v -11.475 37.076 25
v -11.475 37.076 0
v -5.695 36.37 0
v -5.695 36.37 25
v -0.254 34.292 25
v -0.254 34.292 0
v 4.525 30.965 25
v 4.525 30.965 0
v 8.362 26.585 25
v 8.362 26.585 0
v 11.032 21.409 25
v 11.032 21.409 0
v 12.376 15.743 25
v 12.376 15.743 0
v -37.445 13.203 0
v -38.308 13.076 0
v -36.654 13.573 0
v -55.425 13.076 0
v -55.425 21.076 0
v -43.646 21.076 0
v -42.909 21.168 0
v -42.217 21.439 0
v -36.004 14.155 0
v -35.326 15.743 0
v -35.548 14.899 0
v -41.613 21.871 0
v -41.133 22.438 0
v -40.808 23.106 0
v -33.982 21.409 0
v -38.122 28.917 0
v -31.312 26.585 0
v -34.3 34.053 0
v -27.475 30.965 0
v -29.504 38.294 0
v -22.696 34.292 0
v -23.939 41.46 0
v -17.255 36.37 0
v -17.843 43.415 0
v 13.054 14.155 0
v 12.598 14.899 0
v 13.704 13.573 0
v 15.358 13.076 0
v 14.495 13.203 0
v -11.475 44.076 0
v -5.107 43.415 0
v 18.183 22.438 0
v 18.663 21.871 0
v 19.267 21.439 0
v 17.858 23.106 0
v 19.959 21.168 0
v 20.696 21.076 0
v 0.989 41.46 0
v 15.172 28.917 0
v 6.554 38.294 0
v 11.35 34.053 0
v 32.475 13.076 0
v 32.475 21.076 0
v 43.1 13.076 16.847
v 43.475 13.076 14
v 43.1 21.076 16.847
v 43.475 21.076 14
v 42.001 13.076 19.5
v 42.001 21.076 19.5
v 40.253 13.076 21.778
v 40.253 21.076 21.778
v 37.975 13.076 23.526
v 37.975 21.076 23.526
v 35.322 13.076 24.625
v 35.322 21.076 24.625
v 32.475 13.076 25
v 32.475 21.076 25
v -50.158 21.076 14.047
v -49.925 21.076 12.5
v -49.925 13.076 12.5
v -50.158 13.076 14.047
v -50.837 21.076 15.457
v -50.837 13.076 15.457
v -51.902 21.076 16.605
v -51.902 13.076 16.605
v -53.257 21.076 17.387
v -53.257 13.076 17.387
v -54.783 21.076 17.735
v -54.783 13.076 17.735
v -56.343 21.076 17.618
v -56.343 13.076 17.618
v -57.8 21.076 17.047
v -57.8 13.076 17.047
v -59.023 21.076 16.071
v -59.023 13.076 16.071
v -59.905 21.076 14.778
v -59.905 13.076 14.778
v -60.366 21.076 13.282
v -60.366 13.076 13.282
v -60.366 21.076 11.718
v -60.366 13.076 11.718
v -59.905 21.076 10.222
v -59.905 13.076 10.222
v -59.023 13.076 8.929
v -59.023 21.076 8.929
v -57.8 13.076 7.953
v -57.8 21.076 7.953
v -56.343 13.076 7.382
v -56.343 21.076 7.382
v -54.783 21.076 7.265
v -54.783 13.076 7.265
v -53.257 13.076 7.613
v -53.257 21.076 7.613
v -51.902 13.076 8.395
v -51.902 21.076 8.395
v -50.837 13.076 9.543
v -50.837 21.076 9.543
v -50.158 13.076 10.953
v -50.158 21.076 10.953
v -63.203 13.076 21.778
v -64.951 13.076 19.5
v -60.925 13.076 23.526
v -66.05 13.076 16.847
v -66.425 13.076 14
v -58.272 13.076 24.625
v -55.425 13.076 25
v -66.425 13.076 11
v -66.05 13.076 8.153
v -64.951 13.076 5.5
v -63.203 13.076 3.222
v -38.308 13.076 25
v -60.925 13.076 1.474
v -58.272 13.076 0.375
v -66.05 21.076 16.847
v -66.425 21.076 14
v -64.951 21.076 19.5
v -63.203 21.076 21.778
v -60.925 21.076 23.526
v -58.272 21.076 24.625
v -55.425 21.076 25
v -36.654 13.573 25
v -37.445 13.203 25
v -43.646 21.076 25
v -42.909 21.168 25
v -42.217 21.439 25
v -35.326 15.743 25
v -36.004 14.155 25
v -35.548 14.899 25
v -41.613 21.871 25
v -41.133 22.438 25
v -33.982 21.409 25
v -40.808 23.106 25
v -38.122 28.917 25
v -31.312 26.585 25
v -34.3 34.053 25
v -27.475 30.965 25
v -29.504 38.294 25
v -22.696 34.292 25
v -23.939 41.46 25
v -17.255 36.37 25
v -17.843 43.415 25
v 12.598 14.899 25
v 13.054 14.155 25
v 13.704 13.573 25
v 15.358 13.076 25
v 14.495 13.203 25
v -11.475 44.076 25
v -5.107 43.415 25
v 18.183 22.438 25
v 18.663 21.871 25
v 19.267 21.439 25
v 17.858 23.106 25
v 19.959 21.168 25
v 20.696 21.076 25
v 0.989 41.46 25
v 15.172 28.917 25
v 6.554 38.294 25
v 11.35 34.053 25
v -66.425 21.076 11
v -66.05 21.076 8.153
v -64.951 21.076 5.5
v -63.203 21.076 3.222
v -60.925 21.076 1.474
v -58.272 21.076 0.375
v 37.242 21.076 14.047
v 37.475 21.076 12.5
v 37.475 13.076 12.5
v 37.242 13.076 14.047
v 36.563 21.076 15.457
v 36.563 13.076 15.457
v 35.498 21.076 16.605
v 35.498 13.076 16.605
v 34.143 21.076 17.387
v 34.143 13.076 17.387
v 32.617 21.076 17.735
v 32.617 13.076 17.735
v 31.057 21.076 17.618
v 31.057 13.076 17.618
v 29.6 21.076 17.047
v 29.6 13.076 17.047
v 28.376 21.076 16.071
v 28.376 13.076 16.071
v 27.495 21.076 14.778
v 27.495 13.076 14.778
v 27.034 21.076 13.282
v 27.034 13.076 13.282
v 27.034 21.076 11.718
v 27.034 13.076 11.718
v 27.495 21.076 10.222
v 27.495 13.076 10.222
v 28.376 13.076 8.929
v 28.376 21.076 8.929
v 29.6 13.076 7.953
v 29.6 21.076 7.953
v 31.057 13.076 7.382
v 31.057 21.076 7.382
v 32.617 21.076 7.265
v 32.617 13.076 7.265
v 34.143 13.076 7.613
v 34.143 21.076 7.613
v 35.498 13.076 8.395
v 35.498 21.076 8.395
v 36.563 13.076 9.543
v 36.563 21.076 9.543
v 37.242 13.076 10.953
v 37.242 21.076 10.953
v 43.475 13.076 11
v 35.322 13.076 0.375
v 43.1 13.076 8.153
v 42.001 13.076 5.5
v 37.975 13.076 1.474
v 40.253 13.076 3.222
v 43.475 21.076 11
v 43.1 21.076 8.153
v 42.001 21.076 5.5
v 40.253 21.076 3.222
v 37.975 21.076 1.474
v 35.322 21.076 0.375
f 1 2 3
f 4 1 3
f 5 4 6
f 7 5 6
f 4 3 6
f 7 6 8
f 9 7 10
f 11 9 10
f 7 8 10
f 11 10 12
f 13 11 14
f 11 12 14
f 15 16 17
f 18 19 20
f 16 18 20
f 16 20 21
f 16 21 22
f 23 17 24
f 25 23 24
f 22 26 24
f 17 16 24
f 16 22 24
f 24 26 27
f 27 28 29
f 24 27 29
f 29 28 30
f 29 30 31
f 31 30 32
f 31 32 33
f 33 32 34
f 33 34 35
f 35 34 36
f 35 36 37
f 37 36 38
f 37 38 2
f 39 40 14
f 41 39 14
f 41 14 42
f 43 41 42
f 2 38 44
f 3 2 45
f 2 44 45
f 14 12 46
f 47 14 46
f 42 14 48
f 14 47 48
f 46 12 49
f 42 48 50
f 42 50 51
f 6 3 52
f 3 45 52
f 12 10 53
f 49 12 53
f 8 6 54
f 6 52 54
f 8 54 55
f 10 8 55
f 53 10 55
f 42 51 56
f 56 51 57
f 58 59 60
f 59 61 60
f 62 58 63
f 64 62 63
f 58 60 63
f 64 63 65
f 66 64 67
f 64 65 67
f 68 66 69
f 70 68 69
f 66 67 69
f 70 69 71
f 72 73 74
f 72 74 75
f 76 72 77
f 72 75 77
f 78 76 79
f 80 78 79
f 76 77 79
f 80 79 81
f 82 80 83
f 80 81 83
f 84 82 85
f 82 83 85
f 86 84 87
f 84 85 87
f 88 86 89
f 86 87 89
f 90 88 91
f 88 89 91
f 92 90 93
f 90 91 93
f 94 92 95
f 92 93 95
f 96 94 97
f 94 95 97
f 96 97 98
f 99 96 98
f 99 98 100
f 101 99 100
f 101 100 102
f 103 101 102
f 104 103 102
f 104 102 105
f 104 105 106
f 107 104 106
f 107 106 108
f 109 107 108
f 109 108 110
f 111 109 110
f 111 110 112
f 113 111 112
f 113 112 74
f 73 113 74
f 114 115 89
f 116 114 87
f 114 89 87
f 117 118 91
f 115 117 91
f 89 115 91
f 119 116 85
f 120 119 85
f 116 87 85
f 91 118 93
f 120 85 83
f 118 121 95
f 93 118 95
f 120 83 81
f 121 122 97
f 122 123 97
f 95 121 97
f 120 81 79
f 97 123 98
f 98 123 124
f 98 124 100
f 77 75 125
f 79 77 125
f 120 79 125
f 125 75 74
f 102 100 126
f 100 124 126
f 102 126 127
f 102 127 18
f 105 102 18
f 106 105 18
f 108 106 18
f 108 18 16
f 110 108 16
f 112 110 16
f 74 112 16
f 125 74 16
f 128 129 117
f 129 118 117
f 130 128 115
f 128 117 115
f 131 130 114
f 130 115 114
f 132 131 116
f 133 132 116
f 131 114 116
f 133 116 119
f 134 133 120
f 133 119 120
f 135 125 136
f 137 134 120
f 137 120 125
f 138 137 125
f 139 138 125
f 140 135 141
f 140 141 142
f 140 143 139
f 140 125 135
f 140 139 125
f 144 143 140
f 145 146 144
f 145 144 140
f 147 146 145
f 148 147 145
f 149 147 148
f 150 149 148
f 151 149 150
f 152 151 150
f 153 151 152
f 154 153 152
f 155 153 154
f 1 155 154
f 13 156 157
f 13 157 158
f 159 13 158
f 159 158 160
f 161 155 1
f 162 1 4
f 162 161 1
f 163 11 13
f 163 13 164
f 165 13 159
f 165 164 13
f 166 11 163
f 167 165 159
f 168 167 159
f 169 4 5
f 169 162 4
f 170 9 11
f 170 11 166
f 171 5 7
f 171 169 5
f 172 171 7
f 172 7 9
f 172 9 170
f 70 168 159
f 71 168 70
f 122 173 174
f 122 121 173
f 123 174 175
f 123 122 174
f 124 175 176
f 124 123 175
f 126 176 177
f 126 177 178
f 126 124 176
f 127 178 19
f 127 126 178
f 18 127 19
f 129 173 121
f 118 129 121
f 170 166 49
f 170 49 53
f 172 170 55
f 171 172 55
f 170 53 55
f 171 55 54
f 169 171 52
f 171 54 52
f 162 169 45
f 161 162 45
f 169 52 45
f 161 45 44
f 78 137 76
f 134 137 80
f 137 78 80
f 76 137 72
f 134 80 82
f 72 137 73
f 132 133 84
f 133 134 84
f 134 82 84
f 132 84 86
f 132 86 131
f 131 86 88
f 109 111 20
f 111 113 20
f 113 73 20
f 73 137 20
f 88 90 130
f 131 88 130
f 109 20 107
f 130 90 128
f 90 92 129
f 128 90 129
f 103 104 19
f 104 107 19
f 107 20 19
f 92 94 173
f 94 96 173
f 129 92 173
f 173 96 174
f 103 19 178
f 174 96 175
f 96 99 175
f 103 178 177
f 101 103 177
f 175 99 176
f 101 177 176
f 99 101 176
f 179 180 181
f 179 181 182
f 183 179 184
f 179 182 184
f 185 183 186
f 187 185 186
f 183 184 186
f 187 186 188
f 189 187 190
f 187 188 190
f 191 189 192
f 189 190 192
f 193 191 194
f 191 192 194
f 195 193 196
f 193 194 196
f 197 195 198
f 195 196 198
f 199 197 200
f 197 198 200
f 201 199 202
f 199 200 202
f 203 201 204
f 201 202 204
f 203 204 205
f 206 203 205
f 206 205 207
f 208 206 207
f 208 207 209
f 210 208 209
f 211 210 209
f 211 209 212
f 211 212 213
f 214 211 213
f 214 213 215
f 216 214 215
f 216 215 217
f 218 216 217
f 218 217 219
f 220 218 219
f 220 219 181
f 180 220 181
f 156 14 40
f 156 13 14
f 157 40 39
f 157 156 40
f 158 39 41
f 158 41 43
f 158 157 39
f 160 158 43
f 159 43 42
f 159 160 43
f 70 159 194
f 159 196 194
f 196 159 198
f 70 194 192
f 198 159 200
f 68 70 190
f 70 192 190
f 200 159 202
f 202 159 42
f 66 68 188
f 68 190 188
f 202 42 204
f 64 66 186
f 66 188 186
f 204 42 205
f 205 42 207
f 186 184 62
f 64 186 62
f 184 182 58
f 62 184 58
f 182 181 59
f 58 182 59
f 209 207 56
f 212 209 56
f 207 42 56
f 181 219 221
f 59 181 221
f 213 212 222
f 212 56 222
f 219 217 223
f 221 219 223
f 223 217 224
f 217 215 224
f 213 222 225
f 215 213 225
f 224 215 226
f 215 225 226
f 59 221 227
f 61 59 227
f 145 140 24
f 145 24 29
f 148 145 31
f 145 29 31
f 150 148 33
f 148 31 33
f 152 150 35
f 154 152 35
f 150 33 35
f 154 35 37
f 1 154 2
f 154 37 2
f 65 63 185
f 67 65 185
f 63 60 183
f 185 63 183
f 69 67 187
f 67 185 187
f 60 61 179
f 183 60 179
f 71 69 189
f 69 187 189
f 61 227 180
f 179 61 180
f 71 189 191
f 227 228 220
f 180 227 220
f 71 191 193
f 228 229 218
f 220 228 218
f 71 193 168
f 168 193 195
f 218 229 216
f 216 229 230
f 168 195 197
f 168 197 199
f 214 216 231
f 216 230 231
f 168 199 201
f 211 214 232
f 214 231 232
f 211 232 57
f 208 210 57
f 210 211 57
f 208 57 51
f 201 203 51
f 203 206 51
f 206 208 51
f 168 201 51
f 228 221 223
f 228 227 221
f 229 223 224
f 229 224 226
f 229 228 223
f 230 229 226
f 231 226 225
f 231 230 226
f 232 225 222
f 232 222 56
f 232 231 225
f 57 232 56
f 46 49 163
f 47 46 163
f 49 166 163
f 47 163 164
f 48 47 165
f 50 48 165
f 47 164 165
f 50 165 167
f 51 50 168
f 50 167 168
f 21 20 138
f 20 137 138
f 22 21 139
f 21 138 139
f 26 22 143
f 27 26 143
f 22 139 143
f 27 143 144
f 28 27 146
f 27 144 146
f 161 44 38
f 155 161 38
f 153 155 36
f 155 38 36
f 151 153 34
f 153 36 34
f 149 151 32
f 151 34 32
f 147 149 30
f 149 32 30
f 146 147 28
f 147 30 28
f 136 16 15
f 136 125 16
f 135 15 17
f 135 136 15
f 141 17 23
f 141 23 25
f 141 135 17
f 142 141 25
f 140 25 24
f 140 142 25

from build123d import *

# Parameters (mm, degrees)
F1_DEPTH = 25
F2_R     = 11
F3_R     = 3
F4_R     = 3
F6_D     = 10.5


with BuildPart() as f1:
    # F0 (on Top) → F1 (new body)
    with BuildSketch(Plane.XY):
        with BuildLine():
            ThreePointArc((-42.475013, 13.076226), (-42.211382, 17.110535), (-41.424972, 21.076226))
            Line((-41.424972, 21.076226), (-66.424972, 21.076226))
            Line((-66.424972, 21.076226), (-66.424972, 13.076226))
            Line((-66.424972, 13.076226), (-42.475013, 13.076226))
        make_face()
        with BuildLine():
            Line((43.474945, 21.076226), (18.474945, 21.076226))
            ThreePointArc((18.474945, 21.076226), (19.261355, 17.110535), (19.524987, 13.076226))
            Line((19.524987, 13.076226), (43.474945, 13.076226))
            Line((43.474945, 13.076226), (43.474945, 21.076226))
        make_face()
        with BuildLine():
            ThreePointArc((18.474945, 21.076226), (7.406194, 37.662808), (-11.475013, 44.076226))
            ThreePointArc((-11.475013, 44.076226), (-30.356221, 37.662808), (-41.424972, 21.076226))
            ThreePointArc((-41.424972, 21.076226), (-42.211382, 17.110535), (-42.475013, 13.076226))
            Line((-42.475013, 13.076226), (-35.475013, 13.076226))
            ThreePointArc((-35.475013, 13.076226), (-28.445576, 30.046789), (-11.475013, 37.076226))
            ThreePointArc((-11.475013, 37.076226), (5.495549, 30.046789), (12.524987, 13.076226))
            Line((12.524987, 13.076226), (19.524987, 13.076226))
            ThreePointArc((19.524987, 13.076226), (19.261355, 17.110535), (18.474945, 21.076226))
        make_face()
    extrude(amount=F1_DEPTH)

    # F2
    f2_edges = [f1.edges().sort_by_distance(p)[0] for p in [
        (43.474945, 17.076226, 0),
        (43.474945, 17.076226, 25),
        (-66.424972, 17.076226, 25),
        (-66.424972, 17.076226, 0),
    ]]
    fillet(f2_edges, radius=F2_R)

    # F3
    f3_edges = [f1.edges().sort_by_distance(p)[0] for p in [
        (-35.475013, 13.076226, 12.5),
        (12.524987, 13.076226, 12.5),
    ]]
    fillet(f3_edges, radius=F3_R)

    # F4
    f4_edges = [f1.edges().sort_by_distance(p)[0] for p in [
        (-41.424972, 21.076226, 12.5),
        (18.474945, 21.076226, 12.5),
    ]]
    fillet(f4_edges, radius=F4_R)

    # F6 (through all)
    with Locations(Plane(origin=(0, 21.076226, 0), x_dir=(-1, 0, 0), z_dir=(0, 1, 0))):
        with Locations((55.174972, 12.5), (-32.224945, 12.5)):
            Hole(F6_D / 2)


solid = f1.part
